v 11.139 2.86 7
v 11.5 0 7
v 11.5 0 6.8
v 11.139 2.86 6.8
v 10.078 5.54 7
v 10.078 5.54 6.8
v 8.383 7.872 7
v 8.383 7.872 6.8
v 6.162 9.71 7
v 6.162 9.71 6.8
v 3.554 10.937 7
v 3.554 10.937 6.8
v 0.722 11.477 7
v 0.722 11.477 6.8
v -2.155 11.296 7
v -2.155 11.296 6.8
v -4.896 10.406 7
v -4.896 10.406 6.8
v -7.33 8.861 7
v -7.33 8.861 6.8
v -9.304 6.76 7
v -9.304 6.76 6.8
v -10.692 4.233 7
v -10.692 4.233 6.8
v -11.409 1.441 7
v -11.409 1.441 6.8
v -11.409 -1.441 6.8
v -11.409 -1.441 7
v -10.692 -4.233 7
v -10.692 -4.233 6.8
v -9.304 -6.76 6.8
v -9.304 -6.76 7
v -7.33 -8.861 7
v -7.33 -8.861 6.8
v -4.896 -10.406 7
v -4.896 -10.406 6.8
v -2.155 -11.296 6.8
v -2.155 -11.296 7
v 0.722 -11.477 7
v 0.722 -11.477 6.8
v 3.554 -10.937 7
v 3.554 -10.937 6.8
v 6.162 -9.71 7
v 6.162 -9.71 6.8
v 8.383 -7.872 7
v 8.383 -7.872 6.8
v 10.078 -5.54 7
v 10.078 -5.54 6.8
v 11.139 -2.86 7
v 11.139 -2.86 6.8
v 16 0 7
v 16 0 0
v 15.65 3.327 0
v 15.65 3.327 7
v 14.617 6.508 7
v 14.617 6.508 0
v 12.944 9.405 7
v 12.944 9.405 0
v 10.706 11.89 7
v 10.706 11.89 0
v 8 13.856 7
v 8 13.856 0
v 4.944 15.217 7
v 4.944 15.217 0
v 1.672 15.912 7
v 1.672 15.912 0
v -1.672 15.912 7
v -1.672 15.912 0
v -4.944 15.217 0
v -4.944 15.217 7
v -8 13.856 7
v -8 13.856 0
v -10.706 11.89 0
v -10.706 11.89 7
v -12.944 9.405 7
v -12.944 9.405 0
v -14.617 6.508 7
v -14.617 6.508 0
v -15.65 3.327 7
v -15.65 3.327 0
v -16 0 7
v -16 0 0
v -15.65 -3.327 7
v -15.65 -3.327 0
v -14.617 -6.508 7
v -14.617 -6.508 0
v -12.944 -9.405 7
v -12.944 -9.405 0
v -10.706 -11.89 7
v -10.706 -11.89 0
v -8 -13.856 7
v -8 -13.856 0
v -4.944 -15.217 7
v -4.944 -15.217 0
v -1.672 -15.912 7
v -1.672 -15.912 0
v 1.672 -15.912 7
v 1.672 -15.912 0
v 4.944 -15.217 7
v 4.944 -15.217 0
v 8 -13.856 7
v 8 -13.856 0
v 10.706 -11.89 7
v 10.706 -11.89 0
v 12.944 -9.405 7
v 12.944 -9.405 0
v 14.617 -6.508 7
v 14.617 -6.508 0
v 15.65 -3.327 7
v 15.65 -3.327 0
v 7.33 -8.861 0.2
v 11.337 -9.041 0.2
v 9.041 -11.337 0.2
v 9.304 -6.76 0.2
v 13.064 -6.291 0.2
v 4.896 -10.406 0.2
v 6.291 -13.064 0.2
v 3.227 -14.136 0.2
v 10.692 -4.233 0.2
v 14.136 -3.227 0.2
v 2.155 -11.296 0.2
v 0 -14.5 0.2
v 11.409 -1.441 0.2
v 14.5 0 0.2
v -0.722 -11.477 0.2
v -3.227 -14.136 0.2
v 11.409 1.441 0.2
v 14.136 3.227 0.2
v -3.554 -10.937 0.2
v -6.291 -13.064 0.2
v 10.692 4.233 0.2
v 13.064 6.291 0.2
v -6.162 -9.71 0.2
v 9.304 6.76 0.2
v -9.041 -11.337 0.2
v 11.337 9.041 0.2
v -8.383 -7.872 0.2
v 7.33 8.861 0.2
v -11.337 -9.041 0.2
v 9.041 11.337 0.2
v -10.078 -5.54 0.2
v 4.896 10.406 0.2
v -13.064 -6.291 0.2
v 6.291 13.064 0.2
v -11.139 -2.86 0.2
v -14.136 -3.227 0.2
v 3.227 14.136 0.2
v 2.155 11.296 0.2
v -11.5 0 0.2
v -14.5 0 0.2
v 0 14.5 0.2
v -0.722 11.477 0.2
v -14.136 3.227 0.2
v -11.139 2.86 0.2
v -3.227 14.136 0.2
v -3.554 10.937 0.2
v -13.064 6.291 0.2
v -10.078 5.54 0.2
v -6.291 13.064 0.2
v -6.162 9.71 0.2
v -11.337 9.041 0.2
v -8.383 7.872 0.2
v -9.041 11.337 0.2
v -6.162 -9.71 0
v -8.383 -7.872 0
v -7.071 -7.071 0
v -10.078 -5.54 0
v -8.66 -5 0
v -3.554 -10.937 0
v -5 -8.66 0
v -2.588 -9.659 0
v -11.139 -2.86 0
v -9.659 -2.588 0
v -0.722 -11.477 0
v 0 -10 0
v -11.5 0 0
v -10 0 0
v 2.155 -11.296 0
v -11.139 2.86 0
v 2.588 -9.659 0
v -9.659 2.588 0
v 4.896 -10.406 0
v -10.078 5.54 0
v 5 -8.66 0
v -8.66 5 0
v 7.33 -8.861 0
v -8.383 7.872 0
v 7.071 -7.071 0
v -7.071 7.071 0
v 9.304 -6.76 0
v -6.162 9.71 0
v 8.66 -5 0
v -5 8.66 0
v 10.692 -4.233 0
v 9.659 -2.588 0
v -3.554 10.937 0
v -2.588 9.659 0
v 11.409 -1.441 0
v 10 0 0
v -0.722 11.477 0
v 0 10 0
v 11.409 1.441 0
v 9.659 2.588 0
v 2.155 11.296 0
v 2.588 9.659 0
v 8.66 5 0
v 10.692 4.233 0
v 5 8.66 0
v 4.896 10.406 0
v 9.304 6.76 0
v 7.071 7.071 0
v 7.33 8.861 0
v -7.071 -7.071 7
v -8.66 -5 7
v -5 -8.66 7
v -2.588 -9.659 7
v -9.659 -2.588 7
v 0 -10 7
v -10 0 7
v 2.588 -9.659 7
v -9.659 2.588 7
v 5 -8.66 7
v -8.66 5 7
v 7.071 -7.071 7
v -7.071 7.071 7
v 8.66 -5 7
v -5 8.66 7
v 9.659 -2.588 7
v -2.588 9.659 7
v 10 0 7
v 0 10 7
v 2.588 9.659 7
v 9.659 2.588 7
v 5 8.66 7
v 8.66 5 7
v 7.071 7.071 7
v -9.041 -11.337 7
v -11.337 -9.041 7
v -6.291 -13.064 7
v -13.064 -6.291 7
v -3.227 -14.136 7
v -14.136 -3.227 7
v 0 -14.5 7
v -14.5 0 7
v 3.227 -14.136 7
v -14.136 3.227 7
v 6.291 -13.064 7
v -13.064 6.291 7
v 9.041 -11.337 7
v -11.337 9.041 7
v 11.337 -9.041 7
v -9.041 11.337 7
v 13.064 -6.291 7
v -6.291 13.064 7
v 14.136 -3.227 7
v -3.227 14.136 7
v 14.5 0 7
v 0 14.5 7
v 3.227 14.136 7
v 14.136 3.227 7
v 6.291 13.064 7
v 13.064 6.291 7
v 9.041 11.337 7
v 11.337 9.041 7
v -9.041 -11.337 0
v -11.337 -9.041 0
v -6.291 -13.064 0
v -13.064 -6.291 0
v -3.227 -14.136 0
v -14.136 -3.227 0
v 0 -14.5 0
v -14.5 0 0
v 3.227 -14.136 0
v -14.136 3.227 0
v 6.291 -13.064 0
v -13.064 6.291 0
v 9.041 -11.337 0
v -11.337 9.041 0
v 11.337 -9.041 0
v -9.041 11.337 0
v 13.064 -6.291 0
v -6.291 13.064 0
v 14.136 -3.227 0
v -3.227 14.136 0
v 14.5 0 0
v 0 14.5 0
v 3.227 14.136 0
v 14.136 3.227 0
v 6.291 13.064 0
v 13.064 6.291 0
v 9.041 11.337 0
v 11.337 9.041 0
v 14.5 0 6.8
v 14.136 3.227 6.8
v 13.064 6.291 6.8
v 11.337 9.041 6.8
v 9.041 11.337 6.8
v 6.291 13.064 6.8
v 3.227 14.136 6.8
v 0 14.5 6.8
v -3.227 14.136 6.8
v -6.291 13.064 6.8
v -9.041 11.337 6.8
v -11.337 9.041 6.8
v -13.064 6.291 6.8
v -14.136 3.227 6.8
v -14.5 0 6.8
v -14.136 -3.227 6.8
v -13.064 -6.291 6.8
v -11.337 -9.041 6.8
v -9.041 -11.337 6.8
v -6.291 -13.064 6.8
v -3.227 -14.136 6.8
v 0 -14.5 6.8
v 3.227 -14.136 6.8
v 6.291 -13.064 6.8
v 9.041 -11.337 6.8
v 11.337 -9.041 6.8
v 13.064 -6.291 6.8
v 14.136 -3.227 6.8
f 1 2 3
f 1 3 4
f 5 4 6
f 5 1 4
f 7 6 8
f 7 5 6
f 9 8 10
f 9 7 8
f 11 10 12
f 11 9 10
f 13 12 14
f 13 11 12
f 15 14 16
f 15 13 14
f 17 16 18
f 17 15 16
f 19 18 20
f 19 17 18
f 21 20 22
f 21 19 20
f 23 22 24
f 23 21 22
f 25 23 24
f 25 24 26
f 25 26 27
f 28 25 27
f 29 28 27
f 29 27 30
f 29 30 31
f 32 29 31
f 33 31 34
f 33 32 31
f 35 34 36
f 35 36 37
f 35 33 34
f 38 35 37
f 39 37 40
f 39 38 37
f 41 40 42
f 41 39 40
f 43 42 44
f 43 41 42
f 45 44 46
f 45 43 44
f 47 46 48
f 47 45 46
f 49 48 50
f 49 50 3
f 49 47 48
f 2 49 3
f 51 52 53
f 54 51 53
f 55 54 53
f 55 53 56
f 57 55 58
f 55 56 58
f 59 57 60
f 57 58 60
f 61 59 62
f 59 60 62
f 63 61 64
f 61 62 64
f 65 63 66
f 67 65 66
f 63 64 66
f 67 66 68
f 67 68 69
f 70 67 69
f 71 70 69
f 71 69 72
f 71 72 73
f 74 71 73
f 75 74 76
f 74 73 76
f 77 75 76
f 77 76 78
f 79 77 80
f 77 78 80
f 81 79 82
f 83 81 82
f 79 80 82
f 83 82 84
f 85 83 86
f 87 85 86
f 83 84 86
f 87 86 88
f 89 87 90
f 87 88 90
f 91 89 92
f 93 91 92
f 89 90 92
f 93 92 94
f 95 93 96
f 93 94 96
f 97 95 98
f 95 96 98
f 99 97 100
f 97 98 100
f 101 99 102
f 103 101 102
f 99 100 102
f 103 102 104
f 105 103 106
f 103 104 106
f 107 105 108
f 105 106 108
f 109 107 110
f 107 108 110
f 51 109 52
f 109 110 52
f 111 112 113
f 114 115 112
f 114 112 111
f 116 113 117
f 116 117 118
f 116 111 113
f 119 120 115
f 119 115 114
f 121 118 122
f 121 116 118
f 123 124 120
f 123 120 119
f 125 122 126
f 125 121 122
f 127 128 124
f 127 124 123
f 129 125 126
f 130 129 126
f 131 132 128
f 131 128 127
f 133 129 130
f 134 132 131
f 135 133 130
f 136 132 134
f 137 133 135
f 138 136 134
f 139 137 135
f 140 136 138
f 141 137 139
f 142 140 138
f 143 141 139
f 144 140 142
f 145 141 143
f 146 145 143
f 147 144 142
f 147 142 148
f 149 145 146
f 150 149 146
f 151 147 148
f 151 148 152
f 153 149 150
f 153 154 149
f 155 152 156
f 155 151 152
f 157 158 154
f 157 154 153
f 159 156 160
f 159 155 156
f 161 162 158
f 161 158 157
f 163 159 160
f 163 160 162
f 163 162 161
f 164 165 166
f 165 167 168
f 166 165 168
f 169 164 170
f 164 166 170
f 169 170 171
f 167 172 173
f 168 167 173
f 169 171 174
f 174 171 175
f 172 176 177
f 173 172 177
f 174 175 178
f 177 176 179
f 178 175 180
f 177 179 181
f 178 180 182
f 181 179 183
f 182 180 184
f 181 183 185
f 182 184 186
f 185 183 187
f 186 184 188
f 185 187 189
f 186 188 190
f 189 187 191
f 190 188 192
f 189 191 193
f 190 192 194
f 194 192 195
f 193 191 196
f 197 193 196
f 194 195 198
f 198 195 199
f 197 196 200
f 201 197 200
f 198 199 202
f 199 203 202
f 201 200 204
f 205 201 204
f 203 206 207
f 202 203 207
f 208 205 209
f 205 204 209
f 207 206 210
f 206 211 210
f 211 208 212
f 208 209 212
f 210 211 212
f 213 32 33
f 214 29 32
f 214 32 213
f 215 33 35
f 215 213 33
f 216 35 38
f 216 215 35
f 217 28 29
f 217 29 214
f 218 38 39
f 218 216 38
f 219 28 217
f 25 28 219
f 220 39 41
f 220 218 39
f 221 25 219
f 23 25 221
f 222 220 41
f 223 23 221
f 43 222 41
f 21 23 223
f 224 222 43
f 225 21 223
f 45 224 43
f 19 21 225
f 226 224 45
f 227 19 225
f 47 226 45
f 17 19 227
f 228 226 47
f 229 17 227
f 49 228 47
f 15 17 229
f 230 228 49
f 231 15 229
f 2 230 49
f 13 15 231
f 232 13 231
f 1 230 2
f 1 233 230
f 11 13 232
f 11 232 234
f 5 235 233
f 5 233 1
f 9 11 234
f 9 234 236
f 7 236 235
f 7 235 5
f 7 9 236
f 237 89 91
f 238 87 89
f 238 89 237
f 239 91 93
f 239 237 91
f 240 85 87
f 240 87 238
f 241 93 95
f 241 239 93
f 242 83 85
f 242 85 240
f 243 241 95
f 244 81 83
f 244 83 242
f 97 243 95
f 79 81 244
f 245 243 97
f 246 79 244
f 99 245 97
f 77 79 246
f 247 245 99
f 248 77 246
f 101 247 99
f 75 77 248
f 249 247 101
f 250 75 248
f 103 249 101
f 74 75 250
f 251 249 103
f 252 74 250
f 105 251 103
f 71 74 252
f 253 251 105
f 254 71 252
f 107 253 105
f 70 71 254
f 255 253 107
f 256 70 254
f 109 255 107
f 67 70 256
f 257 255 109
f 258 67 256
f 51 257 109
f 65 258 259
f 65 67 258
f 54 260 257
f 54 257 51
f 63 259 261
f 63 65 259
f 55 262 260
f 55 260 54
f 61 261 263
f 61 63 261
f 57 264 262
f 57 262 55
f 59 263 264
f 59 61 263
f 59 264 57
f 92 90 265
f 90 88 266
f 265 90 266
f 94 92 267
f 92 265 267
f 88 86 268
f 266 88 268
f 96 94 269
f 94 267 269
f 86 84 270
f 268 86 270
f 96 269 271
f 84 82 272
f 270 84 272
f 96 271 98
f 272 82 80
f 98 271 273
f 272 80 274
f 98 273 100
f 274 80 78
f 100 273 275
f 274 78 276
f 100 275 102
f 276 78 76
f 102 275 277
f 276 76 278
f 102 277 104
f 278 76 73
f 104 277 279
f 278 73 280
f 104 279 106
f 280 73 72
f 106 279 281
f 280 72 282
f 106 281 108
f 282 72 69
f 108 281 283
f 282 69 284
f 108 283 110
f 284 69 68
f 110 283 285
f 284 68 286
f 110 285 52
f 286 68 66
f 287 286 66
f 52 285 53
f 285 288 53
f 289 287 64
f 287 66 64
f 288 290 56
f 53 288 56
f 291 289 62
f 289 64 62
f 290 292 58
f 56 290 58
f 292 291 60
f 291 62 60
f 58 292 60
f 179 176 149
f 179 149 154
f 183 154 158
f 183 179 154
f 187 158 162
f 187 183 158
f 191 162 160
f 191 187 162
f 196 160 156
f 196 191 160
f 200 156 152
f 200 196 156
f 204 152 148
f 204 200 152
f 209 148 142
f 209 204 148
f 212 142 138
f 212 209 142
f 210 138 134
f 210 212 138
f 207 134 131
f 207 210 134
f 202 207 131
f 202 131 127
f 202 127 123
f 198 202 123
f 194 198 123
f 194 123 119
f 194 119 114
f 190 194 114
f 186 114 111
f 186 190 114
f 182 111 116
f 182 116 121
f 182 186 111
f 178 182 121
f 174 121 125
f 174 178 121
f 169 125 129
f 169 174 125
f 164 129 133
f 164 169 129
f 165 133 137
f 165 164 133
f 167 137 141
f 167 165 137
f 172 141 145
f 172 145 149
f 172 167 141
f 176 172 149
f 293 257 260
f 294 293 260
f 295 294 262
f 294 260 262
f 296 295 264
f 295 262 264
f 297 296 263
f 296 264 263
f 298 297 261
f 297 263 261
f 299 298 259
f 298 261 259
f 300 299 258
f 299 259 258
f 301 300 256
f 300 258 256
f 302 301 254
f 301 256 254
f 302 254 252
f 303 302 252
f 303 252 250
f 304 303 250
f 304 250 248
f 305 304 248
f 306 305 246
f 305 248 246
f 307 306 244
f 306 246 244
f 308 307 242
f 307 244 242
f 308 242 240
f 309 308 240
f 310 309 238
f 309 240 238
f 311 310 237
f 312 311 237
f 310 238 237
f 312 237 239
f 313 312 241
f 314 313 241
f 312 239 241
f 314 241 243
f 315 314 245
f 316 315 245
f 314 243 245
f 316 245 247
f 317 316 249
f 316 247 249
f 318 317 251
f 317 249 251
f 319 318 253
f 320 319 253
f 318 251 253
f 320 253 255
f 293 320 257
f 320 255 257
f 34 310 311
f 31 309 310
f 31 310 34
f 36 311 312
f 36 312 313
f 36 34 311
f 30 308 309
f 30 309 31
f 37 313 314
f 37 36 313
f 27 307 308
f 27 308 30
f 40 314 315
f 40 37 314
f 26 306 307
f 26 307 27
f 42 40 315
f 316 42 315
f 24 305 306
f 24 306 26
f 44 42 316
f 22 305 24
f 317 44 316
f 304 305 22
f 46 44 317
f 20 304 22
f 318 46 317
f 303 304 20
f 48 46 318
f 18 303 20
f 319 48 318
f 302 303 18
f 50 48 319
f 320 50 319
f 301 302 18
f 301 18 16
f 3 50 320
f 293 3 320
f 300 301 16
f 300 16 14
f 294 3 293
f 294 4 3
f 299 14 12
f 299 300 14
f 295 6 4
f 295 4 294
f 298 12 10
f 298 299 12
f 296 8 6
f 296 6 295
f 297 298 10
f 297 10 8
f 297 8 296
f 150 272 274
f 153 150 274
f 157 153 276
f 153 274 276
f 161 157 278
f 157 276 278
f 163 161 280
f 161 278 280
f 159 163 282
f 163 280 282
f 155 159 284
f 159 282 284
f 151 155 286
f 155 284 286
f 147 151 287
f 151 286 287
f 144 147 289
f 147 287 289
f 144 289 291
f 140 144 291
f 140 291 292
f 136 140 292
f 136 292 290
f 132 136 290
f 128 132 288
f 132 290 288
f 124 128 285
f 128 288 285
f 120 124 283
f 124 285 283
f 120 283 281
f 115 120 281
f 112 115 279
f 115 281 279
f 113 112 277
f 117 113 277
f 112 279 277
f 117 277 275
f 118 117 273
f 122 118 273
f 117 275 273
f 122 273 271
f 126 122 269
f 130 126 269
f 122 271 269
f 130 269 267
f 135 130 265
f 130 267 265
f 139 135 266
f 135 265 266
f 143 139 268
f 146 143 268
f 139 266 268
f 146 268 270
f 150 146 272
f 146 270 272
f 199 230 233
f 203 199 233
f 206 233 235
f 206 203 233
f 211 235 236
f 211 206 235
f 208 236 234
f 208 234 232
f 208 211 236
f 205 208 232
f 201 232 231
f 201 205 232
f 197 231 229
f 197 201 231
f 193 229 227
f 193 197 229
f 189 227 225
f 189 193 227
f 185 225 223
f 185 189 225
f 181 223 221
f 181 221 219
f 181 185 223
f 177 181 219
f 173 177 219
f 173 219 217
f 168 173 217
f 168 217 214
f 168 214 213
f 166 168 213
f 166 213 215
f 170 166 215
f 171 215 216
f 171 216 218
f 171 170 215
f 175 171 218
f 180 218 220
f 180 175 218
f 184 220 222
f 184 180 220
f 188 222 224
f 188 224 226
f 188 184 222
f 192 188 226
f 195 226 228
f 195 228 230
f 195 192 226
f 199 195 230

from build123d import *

# Parameters (mm, degrees)
ESQUISSE1_R             = 16
ESQUISSE1_R_2           = 10
BOSS_EXTRU_1_DEPTH      = 7
ESQUISSE2_R             = 14.5
ESQUISSE2_R_2           = 11.5
ENL_V_MAT_EXTRU_1_DEPTH = 0.2
ESQUISSE3_R             = 14.5
ESQUISSE3_R_2           = 11.5
ENL_V_MAT_EXTRU_2_DEPTH = 0.2


with BuildPart() as part:
    # Esquisse1 → Boss.-Extru.1 (new body)
    with BuildSketch(Plane.XY):
        Circle(ESQUISSE1_R)
        Circle(ESQUISSE1_R_2, mode=Mode.SUBTRACT)
    extrude(amount=BOSS_EXTRU_1_DEPTH)

    # Esquisse2 → Enlèv. mat.-Extru.1 (cut)
    with BuildSketch(Plane.XY.offset(7)):
        Circle(ESQUISSE2_R)
        Circle(ESQUISSE2_R_2, mode=Mode.SUBTRACT)
    extrude(amount=-ENL_V_MAT_EXTRU_1_DEPTH, mode=Mode.SUBTRACT)

    # Esquisse3 → Enlèv. mat.-Extru.2 (cut)
    with BuildSketch(Plane(origin=(0, 0, 0), x_dir=(-1, 0, 0), z_dir=(0, 0, -1))):
        Circle(ESQUISSE3_R)
        Circle(ESQUISSE3_R_2, mode=Mode.SUBTRACT)
    extrude(amount=-ENL_V_MAT_EXTRU_2_DEPTH, mode=Mode.SUBTRACT)


solid = part.part
